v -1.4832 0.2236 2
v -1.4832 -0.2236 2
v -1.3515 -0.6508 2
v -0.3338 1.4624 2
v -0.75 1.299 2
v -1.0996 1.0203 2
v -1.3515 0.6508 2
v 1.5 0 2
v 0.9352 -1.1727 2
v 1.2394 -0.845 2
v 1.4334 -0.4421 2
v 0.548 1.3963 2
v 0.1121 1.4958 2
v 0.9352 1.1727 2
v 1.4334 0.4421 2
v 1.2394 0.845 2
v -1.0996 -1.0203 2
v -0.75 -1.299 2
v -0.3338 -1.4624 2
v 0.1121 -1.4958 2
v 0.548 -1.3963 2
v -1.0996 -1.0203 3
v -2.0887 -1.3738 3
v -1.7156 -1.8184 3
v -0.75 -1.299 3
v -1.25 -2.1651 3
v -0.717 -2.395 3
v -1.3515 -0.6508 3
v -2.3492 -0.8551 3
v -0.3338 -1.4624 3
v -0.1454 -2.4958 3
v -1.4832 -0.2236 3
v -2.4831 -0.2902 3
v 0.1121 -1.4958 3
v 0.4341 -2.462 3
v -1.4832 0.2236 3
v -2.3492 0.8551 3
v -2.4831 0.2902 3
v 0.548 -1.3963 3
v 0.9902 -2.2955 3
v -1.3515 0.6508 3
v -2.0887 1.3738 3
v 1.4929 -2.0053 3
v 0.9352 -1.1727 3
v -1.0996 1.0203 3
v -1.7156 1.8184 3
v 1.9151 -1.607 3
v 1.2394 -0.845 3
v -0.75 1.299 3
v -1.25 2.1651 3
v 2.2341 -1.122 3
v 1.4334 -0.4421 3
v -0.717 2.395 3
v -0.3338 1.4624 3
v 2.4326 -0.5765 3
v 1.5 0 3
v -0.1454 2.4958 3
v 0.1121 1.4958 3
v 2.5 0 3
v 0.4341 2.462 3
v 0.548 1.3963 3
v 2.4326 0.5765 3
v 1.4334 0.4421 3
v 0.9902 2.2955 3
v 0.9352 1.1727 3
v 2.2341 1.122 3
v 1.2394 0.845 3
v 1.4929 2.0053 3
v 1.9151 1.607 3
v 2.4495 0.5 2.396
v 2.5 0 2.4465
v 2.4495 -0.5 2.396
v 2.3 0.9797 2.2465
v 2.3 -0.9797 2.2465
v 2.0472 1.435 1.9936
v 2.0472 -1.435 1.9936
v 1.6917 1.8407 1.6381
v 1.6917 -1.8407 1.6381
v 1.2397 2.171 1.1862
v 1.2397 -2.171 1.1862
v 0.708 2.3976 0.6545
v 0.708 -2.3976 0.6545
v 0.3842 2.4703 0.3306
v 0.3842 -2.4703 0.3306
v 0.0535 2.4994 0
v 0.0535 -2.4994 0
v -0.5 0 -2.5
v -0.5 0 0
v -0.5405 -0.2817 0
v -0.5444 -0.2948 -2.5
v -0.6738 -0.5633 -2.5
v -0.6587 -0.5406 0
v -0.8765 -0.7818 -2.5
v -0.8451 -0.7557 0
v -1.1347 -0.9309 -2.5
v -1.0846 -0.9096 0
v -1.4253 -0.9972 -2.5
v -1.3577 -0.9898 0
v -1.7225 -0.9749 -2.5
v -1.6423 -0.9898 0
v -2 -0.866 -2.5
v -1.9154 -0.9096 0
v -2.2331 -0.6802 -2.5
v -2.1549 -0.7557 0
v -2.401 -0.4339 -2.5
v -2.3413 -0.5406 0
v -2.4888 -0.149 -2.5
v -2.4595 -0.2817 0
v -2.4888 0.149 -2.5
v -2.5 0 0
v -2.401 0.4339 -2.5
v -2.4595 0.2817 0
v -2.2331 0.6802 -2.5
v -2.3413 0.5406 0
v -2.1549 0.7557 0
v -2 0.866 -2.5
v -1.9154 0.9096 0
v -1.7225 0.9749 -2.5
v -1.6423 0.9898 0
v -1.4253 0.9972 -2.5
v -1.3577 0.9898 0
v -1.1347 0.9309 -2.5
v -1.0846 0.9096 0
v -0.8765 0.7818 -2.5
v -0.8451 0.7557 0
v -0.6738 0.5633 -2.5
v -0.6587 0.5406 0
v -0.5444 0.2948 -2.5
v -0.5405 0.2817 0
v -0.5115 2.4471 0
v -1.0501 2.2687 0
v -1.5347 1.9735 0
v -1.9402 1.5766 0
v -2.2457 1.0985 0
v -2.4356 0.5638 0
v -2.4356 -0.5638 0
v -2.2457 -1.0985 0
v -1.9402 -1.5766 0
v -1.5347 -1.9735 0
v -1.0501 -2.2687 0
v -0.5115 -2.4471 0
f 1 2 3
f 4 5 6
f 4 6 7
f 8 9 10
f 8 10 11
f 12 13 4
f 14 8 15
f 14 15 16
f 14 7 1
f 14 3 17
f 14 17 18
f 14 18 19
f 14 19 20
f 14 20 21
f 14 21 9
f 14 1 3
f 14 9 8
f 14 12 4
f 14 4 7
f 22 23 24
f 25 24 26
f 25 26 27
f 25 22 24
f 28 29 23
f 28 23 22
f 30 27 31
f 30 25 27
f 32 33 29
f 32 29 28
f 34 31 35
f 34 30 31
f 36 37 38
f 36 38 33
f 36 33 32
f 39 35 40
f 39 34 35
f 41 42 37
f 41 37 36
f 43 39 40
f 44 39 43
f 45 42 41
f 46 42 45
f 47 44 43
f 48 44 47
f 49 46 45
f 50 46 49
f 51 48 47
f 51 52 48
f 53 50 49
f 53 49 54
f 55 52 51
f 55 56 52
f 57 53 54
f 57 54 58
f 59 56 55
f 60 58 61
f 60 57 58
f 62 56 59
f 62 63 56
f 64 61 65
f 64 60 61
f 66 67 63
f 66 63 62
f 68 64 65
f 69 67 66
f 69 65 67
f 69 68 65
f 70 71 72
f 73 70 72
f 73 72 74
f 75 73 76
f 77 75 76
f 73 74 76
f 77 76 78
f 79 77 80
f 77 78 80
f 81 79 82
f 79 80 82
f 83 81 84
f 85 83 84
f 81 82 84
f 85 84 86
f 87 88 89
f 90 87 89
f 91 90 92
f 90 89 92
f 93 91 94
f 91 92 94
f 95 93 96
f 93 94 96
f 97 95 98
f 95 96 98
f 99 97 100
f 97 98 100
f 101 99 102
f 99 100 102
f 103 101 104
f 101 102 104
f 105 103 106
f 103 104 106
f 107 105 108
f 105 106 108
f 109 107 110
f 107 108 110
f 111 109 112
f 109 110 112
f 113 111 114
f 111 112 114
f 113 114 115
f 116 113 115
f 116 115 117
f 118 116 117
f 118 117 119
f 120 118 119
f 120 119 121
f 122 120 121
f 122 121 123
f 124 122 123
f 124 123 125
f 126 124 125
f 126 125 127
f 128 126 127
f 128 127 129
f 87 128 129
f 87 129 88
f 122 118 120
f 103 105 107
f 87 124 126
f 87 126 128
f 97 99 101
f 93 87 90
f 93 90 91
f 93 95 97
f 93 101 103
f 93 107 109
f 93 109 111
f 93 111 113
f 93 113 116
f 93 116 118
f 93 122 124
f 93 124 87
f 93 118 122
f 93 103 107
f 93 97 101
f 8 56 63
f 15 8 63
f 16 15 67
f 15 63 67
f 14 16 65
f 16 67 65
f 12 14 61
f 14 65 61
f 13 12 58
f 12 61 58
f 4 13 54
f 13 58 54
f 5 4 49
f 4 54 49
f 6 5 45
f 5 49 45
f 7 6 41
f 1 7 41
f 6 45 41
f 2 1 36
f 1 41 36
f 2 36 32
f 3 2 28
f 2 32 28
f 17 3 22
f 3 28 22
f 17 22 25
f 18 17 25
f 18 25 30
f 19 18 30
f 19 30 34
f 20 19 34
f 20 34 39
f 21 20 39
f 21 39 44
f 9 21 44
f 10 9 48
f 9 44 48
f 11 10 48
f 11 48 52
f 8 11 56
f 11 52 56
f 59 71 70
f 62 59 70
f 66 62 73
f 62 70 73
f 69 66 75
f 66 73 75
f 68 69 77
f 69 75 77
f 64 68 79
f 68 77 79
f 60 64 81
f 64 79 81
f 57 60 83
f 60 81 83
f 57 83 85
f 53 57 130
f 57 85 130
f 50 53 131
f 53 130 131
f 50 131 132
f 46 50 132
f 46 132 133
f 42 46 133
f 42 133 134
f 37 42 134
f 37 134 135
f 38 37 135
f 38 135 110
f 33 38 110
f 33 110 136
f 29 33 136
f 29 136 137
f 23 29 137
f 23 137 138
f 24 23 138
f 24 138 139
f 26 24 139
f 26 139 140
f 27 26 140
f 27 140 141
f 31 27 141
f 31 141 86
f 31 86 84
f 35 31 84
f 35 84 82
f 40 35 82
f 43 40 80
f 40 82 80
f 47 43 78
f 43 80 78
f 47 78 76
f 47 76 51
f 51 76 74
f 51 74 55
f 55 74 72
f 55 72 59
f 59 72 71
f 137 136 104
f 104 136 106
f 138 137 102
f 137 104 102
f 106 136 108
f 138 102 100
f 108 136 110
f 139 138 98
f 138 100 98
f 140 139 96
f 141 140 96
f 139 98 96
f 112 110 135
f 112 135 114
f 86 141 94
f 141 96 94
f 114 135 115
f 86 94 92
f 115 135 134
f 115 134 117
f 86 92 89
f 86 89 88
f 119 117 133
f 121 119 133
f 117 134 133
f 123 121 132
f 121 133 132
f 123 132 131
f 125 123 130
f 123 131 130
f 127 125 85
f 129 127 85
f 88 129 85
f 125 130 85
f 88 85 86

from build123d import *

# Parameters (mm, degrees)
F0_R          = 2.5
F1_DEPTH      = 3
F3_DEPTH      = 25
F3_DEPTH_BACK = 25
F4_R          = 1
F5_DEPTH      = 2.5
F6_R          = 1.5
F7_DEPTH      = 1


with BuildPart() as f1:
    # F0 (on Top) → F1 (new body)
    with BuildSketch(Plane.XY):
        Circle(F0_R)
    extrude(amount=F1_DEPTH)

    # F2 (on Front) → F3 (cut, two sides)
    with BuildSketch(Plane.XZ) as f3_sk:
        Polygon((6.7282968301, 6.6747666272), (-4.7879227272, -4.8414529301), (6.7282968301, -4.8414529301), align=None)
    extrude(amount=-F3_DEPTH, mode=Mode.SUBTRACT)
    extrude(f3_sk.sketch, amount=F3_DEPTH_BACK, mode=Mode.SUBTRACT)

    # F4 (on face) → F5 (join)
    with BuildSketch(Plane(origin=(0, 0, 0), x_dir=(1, 0, 0), z_dir=(0, 0, -1))):
        with Locations((-1.5, 0)):
            Circle(F4_R)
    extrude(amount=F5_DEPTH)

    # F6 (on face) → F7 (cut)
    with BuildSketch(Plane.XY.offset(3)):
        Circle(F6_R)
    extrude(amount=-F7_DEPTH, mode=Mode.SUBTRACT)


solid = f1.part
